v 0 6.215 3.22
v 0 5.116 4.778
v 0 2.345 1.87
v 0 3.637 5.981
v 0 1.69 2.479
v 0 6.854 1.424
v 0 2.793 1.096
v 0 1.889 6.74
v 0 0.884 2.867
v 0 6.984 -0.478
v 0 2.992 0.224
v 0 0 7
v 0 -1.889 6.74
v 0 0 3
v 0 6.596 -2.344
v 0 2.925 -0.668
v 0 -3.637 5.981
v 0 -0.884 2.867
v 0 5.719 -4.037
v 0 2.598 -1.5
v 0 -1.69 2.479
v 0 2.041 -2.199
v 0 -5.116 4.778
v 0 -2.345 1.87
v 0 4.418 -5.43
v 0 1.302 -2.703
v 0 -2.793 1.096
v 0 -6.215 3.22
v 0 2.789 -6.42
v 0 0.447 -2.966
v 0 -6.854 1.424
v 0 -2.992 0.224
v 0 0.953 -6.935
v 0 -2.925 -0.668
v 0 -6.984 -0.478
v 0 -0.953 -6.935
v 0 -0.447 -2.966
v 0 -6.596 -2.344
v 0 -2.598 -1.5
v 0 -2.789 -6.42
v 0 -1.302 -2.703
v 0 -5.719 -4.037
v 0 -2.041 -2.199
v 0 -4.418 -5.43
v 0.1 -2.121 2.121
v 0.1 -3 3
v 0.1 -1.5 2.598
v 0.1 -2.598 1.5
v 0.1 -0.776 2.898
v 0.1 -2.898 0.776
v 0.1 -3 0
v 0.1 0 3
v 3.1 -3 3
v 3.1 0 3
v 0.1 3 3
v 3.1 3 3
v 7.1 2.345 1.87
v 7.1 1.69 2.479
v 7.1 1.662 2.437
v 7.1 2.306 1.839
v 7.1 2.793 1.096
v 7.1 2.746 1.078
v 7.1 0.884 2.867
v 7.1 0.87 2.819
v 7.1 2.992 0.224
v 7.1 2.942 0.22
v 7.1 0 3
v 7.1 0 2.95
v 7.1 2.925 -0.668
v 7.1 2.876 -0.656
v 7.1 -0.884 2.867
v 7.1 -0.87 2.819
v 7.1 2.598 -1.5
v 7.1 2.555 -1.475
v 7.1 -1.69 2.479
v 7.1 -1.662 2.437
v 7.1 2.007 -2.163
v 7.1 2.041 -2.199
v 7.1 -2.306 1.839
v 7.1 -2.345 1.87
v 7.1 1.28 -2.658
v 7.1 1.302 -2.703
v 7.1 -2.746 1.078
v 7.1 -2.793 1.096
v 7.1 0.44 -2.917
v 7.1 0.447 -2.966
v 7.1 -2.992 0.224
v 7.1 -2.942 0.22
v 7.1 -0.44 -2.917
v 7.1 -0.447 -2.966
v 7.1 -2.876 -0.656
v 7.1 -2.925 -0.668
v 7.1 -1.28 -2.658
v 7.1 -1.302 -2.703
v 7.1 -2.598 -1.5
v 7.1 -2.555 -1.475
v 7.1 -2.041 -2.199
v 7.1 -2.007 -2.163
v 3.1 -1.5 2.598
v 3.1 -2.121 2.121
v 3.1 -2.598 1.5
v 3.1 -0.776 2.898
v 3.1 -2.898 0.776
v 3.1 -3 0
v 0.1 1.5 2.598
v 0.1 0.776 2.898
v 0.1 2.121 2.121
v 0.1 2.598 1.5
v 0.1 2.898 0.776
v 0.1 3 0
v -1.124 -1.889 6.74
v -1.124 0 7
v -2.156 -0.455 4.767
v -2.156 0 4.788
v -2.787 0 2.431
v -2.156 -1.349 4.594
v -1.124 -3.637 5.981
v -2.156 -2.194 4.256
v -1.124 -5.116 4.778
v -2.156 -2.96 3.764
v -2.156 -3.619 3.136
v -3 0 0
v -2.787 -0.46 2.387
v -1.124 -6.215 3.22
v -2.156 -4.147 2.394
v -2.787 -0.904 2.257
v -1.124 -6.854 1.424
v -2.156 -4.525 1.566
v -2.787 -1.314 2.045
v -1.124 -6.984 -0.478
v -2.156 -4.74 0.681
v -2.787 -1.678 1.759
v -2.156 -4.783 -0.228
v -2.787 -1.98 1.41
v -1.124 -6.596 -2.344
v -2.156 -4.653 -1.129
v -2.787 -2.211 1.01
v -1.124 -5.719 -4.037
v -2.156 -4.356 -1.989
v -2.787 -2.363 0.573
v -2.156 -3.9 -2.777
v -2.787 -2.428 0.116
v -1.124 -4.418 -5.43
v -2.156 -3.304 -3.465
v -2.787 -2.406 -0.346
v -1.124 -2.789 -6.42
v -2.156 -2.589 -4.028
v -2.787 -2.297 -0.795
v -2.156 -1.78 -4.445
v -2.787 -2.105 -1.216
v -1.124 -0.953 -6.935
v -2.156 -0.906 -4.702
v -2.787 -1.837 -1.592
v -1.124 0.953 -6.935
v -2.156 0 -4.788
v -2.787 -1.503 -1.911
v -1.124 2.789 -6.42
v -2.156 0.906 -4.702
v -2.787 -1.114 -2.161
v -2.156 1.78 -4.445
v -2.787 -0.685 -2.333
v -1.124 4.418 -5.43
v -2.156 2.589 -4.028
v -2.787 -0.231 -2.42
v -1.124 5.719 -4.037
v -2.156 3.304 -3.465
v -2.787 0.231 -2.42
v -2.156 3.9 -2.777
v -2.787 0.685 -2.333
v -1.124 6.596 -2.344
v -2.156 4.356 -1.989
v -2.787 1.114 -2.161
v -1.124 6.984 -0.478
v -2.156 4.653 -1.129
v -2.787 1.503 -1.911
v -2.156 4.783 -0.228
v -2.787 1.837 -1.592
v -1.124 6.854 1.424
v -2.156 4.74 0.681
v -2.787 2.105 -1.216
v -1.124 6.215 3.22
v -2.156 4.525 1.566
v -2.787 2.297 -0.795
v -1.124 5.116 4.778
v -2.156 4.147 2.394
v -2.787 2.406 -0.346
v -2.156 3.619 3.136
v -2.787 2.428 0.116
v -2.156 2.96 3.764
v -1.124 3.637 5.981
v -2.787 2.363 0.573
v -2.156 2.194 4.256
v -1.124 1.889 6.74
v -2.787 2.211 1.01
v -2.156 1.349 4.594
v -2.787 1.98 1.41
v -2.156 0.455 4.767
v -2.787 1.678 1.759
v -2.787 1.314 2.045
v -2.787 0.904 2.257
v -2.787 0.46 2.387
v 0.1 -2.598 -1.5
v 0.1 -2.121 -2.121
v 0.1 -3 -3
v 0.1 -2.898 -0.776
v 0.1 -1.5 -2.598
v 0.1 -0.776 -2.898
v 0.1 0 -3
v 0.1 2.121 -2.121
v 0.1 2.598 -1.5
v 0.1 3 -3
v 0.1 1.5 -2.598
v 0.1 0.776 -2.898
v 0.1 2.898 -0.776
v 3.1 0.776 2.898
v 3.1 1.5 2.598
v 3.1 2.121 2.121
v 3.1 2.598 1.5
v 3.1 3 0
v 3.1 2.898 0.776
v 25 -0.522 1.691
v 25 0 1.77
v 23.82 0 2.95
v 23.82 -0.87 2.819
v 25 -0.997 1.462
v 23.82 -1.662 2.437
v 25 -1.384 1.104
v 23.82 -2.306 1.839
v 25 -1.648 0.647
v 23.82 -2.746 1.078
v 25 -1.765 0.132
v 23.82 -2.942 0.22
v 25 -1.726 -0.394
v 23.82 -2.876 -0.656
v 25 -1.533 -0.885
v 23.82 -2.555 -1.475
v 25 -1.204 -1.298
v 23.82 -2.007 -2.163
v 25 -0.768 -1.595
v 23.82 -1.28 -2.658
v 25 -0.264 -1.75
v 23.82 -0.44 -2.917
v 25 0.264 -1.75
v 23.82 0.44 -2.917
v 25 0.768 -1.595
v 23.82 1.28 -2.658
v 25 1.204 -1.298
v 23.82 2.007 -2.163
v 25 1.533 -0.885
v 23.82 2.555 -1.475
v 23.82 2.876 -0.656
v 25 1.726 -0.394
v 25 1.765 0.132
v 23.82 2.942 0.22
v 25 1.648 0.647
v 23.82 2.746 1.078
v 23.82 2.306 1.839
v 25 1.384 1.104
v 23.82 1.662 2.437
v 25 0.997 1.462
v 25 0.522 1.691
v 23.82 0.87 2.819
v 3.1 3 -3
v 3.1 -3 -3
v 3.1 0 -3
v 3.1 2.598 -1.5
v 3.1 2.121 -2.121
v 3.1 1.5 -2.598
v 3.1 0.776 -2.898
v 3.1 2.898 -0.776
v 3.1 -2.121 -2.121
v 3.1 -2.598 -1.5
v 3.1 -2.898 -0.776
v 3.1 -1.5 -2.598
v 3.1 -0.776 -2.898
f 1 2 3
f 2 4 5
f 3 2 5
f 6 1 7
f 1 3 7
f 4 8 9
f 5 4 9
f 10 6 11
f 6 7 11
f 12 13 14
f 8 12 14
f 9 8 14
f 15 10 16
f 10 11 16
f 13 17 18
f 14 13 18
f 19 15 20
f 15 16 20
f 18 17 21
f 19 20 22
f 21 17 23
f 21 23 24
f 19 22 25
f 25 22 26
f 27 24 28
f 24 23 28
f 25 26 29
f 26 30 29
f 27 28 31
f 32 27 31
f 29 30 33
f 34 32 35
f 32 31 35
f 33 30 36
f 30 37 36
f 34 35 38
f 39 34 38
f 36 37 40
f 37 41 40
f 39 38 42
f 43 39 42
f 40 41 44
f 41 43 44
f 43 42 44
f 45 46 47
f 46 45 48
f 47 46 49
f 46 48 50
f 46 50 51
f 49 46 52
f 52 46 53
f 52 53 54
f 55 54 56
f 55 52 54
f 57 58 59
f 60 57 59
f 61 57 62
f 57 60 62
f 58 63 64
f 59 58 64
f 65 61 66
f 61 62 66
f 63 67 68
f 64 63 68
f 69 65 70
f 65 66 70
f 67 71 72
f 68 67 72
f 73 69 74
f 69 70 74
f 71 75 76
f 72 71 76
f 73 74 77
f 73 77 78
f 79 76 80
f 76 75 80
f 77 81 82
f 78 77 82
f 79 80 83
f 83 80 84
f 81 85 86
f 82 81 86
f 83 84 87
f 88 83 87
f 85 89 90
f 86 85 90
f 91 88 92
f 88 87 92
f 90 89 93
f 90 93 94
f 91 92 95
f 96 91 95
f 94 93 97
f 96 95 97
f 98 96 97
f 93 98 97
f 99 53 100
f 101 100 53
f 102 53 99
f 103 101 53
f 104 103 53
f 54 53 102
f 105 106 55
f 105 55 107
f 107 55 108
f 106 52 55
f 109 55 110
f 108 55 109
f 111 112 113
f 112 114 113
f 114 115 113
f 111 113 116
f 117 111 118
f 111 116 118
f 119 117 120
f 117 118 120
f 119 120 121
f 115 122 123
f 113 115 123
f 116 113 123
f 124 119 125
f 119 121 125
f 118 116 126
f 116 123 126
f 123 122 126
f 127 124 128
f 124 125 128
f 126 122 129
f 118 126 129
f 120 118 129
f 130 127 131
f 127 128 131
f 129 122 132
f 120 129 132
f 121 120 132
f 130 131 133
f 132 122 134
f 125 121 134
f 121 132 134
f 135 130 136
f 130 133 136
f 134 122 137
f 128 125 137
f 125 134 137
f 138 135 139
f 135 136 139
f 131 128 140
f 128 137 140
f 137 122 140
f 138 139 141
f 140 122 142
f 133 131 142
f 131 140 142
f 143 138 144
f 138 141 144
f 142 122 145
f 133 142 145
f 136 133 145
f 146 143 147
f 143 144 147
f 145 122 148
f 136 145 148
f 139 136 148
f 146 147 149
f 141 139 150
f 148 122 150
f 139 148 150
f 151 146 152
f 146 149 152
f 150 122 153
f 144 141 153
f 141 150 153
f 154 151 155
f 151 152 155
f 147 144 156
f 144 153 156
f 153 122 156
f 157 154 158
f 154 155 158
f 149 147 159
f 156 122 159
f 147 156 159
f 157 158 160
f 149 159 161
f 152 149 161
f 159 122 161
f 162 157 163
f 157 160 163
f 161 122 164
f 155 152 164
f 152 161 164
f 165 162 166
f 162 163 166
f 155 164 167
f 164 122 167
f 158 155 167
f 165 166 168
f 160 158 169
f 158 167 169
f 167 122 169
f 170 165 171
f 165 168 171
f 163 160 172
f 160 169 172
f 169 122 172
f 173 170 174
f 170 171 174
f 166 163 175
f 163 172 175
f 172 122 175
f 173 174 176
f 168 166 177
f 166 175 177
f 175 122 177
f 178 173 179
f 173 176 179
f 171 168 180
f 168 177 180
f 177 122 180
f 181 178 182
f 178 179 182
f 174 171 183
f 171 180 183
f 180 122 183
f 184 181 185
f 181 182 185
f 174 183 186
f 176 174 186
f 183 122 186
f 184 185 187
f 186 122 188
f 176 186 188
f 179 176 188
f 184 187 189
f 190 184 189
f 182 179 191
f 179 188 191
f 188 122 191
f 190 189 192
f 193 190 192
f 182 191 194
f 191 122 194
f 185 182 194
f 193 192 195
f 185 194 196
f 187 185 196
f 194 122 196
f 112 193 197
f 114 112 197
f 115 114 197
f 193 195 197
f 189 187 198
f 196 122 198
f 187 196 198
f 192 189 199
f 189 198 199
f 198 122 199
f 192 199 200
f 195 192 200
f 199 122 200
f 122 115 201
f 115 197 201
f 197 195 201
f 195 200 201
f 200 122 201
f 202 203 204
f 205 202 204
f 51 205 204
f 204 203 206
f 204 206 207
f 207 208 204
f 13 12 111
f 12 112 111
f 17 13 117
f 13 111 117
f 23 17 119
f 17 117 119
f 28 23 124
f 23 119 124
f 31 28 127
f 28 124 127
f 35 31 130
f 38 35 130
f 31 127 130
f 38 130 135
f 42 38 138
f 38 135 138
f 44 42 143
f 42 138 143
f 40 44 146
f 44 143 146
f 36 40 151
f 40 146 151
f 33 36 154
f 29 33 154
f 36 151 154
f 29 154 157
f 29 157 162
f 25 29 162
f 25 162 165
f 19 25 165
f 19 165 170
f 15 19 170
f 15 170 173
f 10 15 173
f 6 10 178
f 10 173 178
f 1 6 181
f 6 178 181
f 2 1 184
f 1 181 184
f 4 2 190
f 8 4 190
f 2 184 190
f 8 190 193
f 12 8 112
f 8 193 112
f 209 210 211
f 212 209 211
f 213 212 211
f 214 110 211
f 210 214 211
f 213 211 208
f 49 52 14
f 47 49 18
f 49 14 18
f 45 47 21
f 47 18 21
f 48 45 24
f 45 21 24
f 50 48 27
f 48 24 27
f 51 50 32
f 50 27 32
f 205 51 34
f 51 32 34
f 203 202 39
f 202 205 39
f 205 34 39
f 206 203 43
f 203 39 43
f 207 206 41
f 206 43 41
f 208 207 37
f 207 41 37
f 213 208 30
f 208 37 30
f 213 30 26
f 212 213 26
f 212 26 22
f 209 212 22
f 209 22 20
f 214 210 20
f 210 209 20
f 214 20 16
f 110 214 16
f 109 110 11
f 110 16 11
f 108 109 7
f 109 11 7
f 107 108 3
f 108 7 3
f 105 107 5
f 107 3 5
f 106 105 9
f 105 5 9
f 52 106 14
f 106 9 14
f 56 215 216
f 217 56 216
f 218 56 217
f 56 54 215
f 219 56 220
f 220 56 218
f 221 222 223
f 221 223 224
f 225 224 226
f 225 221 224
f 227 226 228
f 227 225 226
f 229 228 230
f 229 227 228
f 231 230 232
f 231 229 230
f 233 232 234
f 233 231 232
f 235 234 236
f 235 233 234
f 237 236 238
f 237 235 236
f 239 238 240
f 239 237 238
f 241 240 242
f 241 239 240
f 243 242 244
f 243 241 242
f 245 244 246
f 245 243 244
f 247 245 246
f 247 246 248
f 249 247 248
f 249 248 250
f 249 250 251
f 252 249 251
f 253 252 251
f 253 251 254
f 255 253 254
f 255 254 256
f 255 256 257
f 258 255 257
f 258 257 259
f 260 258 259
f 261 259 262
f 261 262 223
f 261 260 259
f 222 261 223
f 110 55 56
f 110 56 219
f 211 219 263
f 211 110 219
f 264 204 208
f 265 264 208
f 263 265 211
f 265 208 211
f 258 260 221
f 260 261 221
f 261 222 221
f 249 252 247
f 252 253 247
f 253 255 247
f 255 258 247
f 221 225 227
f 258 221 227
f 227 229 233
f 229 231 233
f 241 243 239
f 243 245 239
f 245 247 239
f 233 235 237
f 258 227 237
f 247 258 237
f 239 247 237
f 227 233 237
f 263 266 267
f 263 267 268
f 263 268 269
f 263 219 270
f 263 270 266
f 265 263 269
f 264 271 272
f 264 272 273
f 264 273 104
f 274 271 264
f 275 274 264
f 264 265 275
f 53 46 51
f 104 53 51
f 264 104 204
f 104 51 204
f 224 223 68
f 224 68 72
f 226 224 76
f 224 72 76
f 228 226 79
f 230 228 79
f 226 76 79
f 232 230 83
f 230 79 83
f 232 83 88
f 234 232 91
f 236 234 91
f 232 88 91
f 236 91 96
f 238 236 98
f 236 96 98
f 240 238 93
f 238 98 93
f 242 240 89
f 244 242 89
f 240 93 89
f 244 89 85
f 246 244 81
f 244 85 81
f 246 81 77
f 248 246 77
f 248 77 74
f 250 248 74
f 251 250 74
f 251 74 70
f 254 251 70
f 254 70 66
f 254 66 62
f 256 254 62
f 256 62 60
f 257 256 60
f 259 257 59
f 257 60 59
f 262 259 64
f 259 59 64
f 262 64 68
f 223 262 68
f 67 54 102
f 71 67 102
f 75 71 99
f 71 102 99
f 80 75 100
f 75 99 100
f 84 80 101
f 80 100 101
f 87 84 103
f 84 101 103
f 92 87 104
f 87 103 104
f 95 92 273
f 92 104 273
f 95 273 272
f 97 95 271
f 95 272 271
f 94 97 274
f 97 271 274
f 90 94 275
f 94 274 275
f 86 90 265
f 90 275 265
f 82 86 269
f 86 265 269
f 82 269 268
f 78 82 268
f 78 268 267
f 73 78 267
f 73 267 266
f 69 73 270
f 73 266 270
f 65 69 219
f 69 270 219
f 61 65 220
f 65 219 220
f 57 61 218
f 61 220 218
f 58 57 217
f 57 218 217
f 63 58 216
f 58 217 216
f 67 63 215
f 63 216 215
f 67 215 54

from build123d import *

# Parameters (mm, degrees)
EXTRUDE_START   = 0.1
SKETCH_2_W      = 6
SKETCH_2_H      = 6
EXTRUDE_1_DEPTH = 3
CHAMFER_1_SIZE  = 1.18


with BuildPart() as part:
    # Эскиз1 → Повернуть1 (revolve)
    with BuildSketch(Plane.XY, mode=Mode.PRIVATE) as revolve_1_sk:
        with BuildLine():
            Line((25, 0), (25, 2.95))
            Line((25, 2.95), (7.1, 2.95))
            Line((7.1, 2.95), (7.1, 3))
            Line((7.1, 3), (0, 3))
            Line((0, 3), (0, 7))
            Line((0, 7), (-1.124355653, 7))
            ThreePointArc((-1.124355653, 7), (-2.522961568, 3.623466631), (-3, 0))
            Line((-3, 0), (25, 0))
        make_face()
    revolve(revolve_1_sk.sketch.rotate(Axis((-121.430503085, 0, 0), (1, 0, 0)), 90), axis=Axis((-121.430503085, 0, 0), (1, 0, 0)))

    # Эскиз2 → Бобышка-Вытянуть1 (add)
    with BuildSketch(Plane(origin=(0, 0, 0), x_dir=(0, 0, -1), z_dir=(1, 0, 0)).offset(EXTRUDE_START)):
        Rectangle(SKETCH_2_W, SKETCH_2_H)
    extrude(amount=EXTRUDE_1_DEPTH)

    # Фаска1
    chamfer_1_edges = [part.edges().sort_by_distance(p)[0] for p in [
        (25, 0, -2.95),
    ]]
    chamfer(chamfer_1_edges, length=CHAMFER_1_SIZE)


solid = part.part
